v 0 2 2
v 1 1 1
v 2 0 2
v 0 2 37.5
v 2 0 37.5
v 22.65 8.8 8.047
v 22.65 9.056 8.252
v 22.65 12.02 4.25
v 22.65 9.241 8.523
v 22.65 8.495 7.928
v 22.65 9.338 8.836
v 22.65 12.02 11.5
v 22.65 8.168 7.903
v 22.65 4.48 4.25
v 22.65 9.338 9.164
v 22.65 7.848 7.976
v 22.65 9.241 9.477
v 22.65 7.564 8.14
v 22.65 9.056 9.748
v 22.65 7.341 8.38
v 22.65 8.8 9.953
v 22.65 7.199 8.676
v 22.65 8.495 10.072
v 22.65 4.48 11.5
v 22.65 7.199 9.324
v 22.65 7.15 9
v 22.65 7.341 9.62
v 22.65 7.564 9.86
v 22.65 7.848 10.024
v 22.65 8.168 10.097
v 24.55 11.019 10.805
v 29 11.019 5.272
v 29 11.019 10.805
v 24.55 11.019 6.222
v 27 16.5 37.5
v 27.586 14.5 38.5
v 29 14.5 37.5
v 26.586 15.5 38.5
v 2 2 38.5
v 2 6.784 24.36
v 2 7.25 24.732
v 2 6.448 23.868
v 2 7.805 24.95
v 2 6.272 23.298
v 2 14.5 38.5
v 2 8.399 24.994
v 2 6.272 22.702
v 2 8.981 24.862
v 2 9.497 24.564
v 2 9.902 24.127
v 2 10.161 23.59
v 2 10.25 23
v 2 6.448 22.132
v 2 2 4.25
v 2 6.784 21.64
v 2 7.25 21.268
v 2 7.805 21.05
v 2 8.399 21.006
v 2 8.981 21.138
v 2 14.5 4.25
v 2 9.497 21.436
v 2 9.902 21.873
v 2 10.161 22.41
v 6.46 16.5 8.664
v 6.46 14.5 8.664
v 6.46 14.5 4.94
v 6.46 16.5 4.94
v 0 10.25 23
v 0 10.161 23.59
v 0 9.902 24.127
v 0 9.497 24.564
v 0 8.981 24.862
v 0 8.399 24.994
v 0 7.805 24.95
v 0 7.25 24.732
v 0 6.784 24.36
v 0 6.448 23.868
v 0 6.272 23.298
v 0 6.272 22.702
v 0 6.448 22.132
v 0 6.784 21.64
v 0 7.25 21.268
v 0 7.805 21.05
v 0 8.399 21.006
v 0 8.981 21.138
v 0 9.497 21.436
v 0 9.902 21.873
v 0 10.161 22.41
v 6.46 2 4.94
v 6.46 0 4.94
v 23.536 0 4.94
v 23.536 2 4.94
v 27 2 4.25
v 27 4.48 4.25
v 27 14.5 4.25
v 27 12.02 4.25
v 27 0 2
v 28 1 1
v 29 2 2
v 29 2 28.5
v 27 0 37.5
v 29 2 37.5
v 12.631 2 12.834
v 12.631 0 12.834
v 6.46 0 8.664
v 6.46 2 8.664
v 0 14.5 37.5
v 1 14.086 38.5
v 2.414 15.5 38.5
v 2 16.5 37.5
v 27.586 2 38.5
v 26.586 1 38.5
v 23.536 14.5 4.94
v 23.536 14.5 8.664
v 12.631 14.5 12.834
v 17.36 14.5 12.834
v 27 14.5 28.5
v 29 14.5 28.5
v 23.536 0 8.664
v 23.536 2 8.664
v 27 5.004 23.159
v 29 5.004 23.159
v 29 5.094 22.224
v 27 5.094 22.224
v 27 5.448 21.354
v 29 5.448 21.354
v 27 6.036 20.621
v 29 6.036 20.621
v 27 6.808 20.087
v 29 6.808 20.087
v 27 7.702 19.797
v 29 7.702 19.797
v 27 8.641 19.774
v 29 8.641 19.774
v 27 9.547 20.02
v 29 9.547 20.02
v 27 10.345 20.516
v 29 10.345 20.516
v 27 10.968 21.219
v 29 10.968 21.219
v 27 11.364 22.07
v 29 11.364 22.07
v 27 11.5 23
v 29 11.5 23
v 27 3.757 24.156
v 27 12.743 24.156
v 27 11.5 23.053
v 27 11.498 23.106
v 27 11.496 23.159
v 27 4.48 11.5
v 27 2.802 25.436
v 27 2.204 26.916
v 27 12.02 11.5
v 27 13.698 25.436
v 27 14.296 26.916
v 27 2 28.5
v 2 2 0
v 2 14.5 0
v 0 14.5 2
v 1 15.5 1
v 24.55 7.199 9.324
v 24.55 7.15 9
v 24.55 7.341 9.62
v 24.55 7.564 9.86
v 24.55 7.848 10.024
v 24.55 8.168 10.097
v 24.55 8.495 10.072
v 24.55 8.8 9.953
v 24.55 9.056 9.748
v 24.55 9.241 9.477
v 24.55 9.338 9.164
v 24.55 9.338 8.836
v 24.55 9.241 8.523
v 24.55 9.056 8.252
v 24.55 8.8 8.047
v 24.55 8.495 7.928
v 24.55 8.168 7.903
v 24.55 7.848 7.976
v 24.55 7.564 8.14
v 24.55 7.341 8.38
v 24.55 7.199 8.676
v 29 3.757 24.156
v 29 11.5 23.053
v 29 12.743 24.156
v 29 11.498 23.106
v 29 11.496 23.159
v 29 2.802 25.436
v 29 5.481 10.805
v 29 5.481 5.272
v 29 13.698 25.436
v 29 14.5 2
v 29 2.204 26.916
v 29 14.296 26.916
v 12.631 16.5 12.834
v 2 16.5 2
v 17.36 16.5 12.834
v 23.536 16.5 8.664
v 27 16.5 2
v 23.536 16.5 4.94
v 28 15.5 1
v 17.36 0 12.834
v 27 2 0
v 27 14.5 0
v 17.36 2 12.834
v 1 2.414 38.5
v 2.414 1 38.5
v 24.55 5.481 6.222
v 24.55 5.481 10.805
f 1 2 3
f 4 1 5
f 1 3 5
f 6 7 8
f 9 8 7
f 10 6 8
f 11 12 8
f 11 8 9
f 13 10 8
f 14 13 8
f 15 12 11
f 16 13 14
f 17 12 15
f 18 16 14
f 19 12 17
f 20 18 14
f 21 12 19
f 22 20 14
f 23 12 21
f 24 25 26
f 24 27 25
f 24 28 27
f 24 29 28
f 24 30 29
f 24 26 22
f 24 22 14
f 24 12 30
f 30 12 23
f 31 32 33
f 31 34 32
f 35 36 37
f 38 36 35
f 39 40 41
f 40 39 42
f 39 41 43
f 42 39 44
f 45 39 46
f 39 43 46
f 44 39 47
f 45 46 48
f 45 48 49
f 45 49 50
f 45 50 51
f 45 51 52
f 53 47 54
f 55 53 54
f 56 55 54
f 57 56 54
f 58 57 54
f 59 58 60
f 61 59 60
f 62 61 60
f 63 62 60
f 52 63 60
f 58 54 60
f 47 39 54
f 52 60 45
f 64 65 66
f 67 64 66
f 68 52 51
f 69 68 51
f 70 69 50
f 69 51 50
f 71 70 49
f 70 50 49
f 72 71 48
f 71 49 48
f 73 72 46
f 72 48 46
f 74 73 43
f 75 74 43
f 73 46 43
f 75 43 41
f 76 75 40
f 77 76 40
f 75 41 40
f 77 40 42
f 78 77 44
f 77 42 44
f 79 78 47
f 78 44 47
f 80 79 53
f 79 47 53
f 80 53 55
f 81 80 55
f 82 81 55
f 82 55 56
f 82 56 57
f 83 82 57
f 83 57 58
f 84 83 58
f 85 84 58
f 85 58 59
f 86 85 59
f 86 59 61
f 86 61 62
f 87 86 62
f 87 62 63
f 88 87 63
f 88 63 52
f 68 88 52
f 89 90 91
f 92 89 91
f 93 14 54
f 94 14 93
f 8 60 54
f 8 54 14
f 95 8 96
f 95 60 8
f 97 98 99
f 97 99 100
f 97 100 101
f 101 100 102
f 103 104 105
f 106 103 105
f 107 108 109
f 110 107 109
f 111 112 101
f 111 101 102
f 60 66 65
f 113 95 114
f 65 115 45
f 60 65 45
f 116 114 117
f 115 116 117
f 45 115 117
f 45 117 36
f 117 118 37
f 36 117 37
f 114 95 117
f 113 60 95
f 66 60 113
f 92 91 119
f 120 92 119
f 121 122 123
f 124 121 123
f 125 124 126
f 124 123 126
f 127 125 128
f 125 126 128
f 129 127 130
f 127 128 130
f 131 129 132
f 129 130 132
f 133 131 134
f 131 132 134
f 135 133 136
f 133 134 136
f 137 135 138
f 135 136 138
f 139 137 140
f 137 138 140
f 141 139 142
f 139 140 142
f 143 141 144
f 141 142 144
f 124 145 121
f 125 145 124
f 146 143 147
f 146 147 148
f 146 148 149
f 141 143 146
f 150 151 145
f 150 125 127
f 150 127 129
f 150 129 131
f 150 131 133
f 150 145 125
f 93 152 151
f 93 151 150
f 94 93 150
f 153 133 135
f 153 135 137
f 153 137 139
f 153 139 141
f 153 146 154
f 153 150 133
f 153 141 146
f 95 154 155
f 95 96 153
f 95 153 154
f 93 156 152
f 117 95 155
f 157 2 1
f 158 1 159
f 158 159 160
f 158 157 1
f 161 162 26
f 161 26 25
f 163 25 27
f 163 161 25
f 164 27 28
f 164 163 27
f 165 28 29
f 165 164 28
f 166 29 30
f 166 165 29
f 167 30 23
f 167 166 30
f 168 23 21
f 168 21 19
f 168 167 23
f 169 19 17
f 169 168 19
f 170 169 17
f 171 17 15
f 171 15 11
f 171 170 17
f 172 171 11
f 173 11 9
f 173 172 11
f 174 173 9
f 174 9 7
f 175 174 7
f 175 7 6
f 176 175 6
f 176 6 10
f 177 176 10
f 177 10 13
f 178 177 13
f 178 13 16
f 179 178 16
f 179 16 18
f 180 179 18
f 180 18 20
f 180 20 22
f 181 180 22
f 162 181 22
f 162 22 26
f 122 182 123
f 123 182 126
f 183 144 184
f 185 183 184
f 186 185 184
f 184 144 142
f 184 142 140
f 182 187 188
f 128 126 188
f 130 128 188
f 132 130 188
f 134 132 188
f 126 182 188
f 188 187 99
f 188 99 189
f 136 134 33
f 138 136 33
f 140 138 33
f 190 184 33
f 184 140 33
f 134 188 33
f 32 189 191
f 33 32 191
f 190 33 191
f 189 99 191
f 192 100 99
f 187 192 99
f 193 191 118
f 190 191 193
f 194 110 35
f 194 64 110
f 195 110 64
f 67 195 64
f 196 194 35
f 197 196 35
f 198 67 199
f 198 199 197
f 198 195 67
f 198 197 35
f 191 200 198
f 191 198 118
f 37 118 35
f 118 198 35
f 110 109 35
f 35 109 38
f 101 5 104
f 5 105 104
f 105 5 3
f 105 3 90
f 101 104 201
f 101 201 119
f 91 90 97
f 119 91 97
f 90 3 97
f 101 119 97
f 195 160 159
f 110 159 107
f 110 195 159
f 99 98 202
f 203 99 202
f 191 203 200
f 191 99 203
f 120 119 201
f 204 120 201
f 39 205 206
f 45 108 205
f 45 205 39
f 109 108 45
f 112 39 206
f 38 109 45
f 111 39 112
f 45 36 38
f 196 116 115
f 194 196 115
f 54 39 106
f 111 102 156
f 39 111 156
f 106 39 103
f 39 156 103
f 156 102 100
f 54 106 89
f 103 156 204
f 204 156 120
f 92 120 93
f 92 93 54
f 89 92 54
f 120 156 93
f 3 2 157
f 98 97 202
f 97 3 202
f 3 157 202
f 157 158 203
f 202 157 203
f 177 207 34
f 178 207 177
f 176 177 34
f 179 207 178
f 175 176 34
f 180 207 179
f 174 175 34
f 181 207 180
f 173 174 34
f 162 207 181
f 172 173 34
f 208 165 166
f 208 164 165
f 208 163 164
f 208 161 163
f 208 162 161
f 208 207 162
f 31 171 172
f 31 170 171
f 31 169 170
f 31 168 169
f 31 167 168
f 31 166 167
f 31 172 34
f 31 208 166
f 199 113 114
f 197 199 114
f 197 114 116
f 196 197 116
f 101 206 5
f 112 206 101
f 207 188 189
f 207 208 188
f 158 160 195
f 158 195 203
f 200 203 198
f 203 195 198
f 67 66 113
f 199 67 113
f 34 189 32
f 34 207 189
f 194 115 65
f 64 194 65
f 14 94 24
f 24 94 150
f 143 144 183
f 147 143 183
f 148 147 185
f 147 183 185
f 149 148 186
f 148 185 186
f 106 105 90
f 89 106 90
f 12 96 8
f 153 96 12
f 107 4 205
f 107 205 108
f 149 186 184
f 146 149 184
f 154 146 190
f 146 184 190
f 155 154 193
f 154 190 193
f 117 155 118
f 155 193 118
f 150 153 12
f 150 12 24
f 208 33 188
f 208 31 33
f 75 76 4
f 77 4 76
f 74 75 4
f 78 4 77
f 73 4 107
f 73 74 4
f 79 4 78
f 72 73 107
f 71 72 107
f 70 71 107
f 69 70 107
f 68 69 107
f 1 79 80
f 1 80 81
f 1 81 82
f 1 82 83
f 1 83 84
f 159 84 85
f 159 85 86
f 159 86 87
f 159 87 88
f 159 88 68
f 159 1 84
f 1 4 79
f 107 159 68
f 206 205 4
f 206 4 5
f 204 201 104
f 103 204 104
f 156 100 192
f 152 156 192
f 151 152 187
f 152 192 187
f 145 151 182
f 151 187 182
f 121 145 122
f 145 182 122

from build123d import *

# Parameters (mm, degrees)
F0_W      = 29
F0_H      = 16.5
F1_DEPTH  = 38.5
F2_T      = -2
F3_DEPTH  = 2.25
F4_SIZE   = 2
F5_SIZE   = 2
F6_SIZE   = 1
F8_DEPTH  = 16.501
F10_DEPTH = 2
F11_R     = 2
F12_DEPTH = 2.001
F13_W     = 7.54
F13_H     = 7.25
F13_R     = 1.1
F14_DEPTH = 4.35
F15_W     = 5.538
F15_H     = 5.533
F17_W     = 5.538
F17_H     = 4.583


with BuildPart() as f1:
    # F0 (on Top) → F1 (new body)
    with BuildSketch(Plane.XY):
        with Locations((14.5, 8.25)):
            Rectangle(F0_W, F0_H)
    extrude(amount=F1_DEPTH)

    # F2
    f2_openings = [f1.faces().sort_by_distance(p)[0] for p in [
        (14.5, 8.25, 38.5),
    ]]
    offset(amount=F2_T, openings=f2_openings)

    # F3 (add): a face of the model
    f3_faces = [f1.faces().sort_by_distance(p)[0] for p in [
        (14.5, 8.25, 2),
    ]]
    extrude(f3_faces, amount=F3_DEPTH)

    # F4
    f4_edges = [f1.edges().sort_by_distance(p)[0] for p in [
        (29, 16.5, 19.25),
        (0, 16.5, 19.25),
        (0, 0, 19.25),
        (29, 0, 19.25),
    ]]
    chamfer(f4_edges, length=F4_SIZE)

    # F5 (call 1 of 4: OpenCascade refuses the feature's edges together)
    f5_edges = [f1.edges().sort_by_distance(p)[0] for p in [
        (0, 8.25, 0),
    ]]
    chamfer(f5_edges, length=F5_SIZE)

    # F5#2 (call 2 of 4)
    f5_2_edges = [f1.edges().sort_by_distance(p)[0] for p in [
        (14.5, 0, 0),
    ]]
    chamfer(f5_2_edges, length=F5_SIZE)

    # F5#3 (call 3 of 4)
    f5_3_edges = [f1.edges().sort_by_distance(p)[0] for p in [
        (29, 8.25, 0),
    ]]
    chamfer(f5_3_edges, length=F5_SIZE)

    # F5#4 (call 4 of 4)
    f5_4_edges = [f1.edges().sort_by_distance(p)[0] for p in [
        (14.5, 16.5, 0),
    ]]
    chamfer(f5_4_edges, length=F5_SIZE)

    # F6
    f6_edges = [f1.edges().sort_by_distance(p)[0] for p in [
        (14.5, 16.5, 38.5),
        (29, 8.25, 38.5),
        (14.5, 0, 38.5),
        (0, 8.25, 38.5),
        (1, 15.5, 38.5),
        (28, 15.5, 38.5),
        (28, 1, 38.5),
        (1, 1, 38.5),
    ]]
    chamfer(f6_edges, length=F6_SIZE)

    # F7 (on face) → F8 (cut, through all)
    with BuildSketch(Plane.XZ):
        Polygon((17.36, 12.834), (12.631, 12.834), (6.46, 8.664), (6.46, 4.94), (23.536, 4.94), (23.536, 8.664), align=None)
    extrude(amount=-F8_DEPTH, mode=Mode.SUBTRACT)

    # F9 (on face) → F10 (cut, through all)
    with BuildSketch(Plane.YZ.offset(29)):
        with BuildLine():
            ThreePointArc((5.0038961688, 23.1590909091), (8.1704306945, 19.7509741882), (11.5, 23))
            ThreePointArc((11.5, 23), (11.4990258118, 23.0795693055), (11.4961038312, 23.1590909091))
            ThreePointArc((11.4961038312, 23.1590909091), (8.25, 22.25), (5.0038961688, 23.1590909091))
        make_face()
        with BuildLine():
            ThreePointArc((5.0038961688, 23.1590909091), (8.25, 22.25), (11.4961038312, 23.1590909091))
            ThreePointArc((11.4961038312, 23.1590909091), (8.25, 26.25), (5.0038961688, 23.1590909091))
        make_face()
        with BuildLine():
            ThreePointArc((5.0038961688, 23.1590909091), (8.25, 26.25), (11.4961038312, 23.1590909091))
            ThreePointArc((11.4961038312, 23.1590909091), (13.6975062618, 25.4361502113), (14.5, 28.5))
            Line((14.5, 28.5), (2, 28.5))
            ThreePointArc((2, 28.5), (2.8024937382, 25.4361502113), (5.0038961688, 23.1590909091))
        make_face()
        with BuildLine():
            Line((2, 28.5), (14.5, 28.5))
            ThreePointArc((14.5, 28.5), (8.25, 34.75), (2, 28.5))
        make_face()
        with BuildLine():
            ThreePointArc((2, 28.5), (8.25, 34.75), (14.5, 28.5))
            Line((14.5, 28.5), (14.5, 38.5))
            Line((14.5, 38.5), (2, 38.5))
            Line((2, 38.5), (2, 28.5))
        make_face()
    extrude(amount=-F10_DEPTH, mode=Mode.SUBTRACT)

    # F11 (on face) → F12 (cut, through all)
    with BuildSketch(Plane.YZ.offset(2)):
        with Locations((8.25, 23)):
            Circle(F11_R)
    extrude(amount=-F12_DEPTH, mode=Mode.SUBTRACT)

    # F13 (on face) → F14 (join)
    with BuildSketch(Plane(origin=(27, 0, 0), x_dir=(0, -1, 0), z_dir=(-1, 0, 0))):
        with Locations((-8.25, 7.875)):
            Rectangle(F13_W, F13_H)
        with Locations((-8.25, 9)):
            Circle(F13_R, mode=Mode.SUBTRACT)
    extrude(amount=F14_DEPTH)

    # F15 (on face) → F18 section 0
    with BuildSketch(Plane.YZ.offset(29)):
        with Locations((8.25, 8.0385)):
            Rectangle(F15_W, F15_H)
    # F17 (on offset) → F18 section 1
    with BuildSketch(Plane.YZ.offset(24.55)):
        with Locations((8.25, 8.5135)):
            Rectangle(F17_W, F17_H)
    loft(mode=Mode.SUBTRACT)


solid = f1.part
